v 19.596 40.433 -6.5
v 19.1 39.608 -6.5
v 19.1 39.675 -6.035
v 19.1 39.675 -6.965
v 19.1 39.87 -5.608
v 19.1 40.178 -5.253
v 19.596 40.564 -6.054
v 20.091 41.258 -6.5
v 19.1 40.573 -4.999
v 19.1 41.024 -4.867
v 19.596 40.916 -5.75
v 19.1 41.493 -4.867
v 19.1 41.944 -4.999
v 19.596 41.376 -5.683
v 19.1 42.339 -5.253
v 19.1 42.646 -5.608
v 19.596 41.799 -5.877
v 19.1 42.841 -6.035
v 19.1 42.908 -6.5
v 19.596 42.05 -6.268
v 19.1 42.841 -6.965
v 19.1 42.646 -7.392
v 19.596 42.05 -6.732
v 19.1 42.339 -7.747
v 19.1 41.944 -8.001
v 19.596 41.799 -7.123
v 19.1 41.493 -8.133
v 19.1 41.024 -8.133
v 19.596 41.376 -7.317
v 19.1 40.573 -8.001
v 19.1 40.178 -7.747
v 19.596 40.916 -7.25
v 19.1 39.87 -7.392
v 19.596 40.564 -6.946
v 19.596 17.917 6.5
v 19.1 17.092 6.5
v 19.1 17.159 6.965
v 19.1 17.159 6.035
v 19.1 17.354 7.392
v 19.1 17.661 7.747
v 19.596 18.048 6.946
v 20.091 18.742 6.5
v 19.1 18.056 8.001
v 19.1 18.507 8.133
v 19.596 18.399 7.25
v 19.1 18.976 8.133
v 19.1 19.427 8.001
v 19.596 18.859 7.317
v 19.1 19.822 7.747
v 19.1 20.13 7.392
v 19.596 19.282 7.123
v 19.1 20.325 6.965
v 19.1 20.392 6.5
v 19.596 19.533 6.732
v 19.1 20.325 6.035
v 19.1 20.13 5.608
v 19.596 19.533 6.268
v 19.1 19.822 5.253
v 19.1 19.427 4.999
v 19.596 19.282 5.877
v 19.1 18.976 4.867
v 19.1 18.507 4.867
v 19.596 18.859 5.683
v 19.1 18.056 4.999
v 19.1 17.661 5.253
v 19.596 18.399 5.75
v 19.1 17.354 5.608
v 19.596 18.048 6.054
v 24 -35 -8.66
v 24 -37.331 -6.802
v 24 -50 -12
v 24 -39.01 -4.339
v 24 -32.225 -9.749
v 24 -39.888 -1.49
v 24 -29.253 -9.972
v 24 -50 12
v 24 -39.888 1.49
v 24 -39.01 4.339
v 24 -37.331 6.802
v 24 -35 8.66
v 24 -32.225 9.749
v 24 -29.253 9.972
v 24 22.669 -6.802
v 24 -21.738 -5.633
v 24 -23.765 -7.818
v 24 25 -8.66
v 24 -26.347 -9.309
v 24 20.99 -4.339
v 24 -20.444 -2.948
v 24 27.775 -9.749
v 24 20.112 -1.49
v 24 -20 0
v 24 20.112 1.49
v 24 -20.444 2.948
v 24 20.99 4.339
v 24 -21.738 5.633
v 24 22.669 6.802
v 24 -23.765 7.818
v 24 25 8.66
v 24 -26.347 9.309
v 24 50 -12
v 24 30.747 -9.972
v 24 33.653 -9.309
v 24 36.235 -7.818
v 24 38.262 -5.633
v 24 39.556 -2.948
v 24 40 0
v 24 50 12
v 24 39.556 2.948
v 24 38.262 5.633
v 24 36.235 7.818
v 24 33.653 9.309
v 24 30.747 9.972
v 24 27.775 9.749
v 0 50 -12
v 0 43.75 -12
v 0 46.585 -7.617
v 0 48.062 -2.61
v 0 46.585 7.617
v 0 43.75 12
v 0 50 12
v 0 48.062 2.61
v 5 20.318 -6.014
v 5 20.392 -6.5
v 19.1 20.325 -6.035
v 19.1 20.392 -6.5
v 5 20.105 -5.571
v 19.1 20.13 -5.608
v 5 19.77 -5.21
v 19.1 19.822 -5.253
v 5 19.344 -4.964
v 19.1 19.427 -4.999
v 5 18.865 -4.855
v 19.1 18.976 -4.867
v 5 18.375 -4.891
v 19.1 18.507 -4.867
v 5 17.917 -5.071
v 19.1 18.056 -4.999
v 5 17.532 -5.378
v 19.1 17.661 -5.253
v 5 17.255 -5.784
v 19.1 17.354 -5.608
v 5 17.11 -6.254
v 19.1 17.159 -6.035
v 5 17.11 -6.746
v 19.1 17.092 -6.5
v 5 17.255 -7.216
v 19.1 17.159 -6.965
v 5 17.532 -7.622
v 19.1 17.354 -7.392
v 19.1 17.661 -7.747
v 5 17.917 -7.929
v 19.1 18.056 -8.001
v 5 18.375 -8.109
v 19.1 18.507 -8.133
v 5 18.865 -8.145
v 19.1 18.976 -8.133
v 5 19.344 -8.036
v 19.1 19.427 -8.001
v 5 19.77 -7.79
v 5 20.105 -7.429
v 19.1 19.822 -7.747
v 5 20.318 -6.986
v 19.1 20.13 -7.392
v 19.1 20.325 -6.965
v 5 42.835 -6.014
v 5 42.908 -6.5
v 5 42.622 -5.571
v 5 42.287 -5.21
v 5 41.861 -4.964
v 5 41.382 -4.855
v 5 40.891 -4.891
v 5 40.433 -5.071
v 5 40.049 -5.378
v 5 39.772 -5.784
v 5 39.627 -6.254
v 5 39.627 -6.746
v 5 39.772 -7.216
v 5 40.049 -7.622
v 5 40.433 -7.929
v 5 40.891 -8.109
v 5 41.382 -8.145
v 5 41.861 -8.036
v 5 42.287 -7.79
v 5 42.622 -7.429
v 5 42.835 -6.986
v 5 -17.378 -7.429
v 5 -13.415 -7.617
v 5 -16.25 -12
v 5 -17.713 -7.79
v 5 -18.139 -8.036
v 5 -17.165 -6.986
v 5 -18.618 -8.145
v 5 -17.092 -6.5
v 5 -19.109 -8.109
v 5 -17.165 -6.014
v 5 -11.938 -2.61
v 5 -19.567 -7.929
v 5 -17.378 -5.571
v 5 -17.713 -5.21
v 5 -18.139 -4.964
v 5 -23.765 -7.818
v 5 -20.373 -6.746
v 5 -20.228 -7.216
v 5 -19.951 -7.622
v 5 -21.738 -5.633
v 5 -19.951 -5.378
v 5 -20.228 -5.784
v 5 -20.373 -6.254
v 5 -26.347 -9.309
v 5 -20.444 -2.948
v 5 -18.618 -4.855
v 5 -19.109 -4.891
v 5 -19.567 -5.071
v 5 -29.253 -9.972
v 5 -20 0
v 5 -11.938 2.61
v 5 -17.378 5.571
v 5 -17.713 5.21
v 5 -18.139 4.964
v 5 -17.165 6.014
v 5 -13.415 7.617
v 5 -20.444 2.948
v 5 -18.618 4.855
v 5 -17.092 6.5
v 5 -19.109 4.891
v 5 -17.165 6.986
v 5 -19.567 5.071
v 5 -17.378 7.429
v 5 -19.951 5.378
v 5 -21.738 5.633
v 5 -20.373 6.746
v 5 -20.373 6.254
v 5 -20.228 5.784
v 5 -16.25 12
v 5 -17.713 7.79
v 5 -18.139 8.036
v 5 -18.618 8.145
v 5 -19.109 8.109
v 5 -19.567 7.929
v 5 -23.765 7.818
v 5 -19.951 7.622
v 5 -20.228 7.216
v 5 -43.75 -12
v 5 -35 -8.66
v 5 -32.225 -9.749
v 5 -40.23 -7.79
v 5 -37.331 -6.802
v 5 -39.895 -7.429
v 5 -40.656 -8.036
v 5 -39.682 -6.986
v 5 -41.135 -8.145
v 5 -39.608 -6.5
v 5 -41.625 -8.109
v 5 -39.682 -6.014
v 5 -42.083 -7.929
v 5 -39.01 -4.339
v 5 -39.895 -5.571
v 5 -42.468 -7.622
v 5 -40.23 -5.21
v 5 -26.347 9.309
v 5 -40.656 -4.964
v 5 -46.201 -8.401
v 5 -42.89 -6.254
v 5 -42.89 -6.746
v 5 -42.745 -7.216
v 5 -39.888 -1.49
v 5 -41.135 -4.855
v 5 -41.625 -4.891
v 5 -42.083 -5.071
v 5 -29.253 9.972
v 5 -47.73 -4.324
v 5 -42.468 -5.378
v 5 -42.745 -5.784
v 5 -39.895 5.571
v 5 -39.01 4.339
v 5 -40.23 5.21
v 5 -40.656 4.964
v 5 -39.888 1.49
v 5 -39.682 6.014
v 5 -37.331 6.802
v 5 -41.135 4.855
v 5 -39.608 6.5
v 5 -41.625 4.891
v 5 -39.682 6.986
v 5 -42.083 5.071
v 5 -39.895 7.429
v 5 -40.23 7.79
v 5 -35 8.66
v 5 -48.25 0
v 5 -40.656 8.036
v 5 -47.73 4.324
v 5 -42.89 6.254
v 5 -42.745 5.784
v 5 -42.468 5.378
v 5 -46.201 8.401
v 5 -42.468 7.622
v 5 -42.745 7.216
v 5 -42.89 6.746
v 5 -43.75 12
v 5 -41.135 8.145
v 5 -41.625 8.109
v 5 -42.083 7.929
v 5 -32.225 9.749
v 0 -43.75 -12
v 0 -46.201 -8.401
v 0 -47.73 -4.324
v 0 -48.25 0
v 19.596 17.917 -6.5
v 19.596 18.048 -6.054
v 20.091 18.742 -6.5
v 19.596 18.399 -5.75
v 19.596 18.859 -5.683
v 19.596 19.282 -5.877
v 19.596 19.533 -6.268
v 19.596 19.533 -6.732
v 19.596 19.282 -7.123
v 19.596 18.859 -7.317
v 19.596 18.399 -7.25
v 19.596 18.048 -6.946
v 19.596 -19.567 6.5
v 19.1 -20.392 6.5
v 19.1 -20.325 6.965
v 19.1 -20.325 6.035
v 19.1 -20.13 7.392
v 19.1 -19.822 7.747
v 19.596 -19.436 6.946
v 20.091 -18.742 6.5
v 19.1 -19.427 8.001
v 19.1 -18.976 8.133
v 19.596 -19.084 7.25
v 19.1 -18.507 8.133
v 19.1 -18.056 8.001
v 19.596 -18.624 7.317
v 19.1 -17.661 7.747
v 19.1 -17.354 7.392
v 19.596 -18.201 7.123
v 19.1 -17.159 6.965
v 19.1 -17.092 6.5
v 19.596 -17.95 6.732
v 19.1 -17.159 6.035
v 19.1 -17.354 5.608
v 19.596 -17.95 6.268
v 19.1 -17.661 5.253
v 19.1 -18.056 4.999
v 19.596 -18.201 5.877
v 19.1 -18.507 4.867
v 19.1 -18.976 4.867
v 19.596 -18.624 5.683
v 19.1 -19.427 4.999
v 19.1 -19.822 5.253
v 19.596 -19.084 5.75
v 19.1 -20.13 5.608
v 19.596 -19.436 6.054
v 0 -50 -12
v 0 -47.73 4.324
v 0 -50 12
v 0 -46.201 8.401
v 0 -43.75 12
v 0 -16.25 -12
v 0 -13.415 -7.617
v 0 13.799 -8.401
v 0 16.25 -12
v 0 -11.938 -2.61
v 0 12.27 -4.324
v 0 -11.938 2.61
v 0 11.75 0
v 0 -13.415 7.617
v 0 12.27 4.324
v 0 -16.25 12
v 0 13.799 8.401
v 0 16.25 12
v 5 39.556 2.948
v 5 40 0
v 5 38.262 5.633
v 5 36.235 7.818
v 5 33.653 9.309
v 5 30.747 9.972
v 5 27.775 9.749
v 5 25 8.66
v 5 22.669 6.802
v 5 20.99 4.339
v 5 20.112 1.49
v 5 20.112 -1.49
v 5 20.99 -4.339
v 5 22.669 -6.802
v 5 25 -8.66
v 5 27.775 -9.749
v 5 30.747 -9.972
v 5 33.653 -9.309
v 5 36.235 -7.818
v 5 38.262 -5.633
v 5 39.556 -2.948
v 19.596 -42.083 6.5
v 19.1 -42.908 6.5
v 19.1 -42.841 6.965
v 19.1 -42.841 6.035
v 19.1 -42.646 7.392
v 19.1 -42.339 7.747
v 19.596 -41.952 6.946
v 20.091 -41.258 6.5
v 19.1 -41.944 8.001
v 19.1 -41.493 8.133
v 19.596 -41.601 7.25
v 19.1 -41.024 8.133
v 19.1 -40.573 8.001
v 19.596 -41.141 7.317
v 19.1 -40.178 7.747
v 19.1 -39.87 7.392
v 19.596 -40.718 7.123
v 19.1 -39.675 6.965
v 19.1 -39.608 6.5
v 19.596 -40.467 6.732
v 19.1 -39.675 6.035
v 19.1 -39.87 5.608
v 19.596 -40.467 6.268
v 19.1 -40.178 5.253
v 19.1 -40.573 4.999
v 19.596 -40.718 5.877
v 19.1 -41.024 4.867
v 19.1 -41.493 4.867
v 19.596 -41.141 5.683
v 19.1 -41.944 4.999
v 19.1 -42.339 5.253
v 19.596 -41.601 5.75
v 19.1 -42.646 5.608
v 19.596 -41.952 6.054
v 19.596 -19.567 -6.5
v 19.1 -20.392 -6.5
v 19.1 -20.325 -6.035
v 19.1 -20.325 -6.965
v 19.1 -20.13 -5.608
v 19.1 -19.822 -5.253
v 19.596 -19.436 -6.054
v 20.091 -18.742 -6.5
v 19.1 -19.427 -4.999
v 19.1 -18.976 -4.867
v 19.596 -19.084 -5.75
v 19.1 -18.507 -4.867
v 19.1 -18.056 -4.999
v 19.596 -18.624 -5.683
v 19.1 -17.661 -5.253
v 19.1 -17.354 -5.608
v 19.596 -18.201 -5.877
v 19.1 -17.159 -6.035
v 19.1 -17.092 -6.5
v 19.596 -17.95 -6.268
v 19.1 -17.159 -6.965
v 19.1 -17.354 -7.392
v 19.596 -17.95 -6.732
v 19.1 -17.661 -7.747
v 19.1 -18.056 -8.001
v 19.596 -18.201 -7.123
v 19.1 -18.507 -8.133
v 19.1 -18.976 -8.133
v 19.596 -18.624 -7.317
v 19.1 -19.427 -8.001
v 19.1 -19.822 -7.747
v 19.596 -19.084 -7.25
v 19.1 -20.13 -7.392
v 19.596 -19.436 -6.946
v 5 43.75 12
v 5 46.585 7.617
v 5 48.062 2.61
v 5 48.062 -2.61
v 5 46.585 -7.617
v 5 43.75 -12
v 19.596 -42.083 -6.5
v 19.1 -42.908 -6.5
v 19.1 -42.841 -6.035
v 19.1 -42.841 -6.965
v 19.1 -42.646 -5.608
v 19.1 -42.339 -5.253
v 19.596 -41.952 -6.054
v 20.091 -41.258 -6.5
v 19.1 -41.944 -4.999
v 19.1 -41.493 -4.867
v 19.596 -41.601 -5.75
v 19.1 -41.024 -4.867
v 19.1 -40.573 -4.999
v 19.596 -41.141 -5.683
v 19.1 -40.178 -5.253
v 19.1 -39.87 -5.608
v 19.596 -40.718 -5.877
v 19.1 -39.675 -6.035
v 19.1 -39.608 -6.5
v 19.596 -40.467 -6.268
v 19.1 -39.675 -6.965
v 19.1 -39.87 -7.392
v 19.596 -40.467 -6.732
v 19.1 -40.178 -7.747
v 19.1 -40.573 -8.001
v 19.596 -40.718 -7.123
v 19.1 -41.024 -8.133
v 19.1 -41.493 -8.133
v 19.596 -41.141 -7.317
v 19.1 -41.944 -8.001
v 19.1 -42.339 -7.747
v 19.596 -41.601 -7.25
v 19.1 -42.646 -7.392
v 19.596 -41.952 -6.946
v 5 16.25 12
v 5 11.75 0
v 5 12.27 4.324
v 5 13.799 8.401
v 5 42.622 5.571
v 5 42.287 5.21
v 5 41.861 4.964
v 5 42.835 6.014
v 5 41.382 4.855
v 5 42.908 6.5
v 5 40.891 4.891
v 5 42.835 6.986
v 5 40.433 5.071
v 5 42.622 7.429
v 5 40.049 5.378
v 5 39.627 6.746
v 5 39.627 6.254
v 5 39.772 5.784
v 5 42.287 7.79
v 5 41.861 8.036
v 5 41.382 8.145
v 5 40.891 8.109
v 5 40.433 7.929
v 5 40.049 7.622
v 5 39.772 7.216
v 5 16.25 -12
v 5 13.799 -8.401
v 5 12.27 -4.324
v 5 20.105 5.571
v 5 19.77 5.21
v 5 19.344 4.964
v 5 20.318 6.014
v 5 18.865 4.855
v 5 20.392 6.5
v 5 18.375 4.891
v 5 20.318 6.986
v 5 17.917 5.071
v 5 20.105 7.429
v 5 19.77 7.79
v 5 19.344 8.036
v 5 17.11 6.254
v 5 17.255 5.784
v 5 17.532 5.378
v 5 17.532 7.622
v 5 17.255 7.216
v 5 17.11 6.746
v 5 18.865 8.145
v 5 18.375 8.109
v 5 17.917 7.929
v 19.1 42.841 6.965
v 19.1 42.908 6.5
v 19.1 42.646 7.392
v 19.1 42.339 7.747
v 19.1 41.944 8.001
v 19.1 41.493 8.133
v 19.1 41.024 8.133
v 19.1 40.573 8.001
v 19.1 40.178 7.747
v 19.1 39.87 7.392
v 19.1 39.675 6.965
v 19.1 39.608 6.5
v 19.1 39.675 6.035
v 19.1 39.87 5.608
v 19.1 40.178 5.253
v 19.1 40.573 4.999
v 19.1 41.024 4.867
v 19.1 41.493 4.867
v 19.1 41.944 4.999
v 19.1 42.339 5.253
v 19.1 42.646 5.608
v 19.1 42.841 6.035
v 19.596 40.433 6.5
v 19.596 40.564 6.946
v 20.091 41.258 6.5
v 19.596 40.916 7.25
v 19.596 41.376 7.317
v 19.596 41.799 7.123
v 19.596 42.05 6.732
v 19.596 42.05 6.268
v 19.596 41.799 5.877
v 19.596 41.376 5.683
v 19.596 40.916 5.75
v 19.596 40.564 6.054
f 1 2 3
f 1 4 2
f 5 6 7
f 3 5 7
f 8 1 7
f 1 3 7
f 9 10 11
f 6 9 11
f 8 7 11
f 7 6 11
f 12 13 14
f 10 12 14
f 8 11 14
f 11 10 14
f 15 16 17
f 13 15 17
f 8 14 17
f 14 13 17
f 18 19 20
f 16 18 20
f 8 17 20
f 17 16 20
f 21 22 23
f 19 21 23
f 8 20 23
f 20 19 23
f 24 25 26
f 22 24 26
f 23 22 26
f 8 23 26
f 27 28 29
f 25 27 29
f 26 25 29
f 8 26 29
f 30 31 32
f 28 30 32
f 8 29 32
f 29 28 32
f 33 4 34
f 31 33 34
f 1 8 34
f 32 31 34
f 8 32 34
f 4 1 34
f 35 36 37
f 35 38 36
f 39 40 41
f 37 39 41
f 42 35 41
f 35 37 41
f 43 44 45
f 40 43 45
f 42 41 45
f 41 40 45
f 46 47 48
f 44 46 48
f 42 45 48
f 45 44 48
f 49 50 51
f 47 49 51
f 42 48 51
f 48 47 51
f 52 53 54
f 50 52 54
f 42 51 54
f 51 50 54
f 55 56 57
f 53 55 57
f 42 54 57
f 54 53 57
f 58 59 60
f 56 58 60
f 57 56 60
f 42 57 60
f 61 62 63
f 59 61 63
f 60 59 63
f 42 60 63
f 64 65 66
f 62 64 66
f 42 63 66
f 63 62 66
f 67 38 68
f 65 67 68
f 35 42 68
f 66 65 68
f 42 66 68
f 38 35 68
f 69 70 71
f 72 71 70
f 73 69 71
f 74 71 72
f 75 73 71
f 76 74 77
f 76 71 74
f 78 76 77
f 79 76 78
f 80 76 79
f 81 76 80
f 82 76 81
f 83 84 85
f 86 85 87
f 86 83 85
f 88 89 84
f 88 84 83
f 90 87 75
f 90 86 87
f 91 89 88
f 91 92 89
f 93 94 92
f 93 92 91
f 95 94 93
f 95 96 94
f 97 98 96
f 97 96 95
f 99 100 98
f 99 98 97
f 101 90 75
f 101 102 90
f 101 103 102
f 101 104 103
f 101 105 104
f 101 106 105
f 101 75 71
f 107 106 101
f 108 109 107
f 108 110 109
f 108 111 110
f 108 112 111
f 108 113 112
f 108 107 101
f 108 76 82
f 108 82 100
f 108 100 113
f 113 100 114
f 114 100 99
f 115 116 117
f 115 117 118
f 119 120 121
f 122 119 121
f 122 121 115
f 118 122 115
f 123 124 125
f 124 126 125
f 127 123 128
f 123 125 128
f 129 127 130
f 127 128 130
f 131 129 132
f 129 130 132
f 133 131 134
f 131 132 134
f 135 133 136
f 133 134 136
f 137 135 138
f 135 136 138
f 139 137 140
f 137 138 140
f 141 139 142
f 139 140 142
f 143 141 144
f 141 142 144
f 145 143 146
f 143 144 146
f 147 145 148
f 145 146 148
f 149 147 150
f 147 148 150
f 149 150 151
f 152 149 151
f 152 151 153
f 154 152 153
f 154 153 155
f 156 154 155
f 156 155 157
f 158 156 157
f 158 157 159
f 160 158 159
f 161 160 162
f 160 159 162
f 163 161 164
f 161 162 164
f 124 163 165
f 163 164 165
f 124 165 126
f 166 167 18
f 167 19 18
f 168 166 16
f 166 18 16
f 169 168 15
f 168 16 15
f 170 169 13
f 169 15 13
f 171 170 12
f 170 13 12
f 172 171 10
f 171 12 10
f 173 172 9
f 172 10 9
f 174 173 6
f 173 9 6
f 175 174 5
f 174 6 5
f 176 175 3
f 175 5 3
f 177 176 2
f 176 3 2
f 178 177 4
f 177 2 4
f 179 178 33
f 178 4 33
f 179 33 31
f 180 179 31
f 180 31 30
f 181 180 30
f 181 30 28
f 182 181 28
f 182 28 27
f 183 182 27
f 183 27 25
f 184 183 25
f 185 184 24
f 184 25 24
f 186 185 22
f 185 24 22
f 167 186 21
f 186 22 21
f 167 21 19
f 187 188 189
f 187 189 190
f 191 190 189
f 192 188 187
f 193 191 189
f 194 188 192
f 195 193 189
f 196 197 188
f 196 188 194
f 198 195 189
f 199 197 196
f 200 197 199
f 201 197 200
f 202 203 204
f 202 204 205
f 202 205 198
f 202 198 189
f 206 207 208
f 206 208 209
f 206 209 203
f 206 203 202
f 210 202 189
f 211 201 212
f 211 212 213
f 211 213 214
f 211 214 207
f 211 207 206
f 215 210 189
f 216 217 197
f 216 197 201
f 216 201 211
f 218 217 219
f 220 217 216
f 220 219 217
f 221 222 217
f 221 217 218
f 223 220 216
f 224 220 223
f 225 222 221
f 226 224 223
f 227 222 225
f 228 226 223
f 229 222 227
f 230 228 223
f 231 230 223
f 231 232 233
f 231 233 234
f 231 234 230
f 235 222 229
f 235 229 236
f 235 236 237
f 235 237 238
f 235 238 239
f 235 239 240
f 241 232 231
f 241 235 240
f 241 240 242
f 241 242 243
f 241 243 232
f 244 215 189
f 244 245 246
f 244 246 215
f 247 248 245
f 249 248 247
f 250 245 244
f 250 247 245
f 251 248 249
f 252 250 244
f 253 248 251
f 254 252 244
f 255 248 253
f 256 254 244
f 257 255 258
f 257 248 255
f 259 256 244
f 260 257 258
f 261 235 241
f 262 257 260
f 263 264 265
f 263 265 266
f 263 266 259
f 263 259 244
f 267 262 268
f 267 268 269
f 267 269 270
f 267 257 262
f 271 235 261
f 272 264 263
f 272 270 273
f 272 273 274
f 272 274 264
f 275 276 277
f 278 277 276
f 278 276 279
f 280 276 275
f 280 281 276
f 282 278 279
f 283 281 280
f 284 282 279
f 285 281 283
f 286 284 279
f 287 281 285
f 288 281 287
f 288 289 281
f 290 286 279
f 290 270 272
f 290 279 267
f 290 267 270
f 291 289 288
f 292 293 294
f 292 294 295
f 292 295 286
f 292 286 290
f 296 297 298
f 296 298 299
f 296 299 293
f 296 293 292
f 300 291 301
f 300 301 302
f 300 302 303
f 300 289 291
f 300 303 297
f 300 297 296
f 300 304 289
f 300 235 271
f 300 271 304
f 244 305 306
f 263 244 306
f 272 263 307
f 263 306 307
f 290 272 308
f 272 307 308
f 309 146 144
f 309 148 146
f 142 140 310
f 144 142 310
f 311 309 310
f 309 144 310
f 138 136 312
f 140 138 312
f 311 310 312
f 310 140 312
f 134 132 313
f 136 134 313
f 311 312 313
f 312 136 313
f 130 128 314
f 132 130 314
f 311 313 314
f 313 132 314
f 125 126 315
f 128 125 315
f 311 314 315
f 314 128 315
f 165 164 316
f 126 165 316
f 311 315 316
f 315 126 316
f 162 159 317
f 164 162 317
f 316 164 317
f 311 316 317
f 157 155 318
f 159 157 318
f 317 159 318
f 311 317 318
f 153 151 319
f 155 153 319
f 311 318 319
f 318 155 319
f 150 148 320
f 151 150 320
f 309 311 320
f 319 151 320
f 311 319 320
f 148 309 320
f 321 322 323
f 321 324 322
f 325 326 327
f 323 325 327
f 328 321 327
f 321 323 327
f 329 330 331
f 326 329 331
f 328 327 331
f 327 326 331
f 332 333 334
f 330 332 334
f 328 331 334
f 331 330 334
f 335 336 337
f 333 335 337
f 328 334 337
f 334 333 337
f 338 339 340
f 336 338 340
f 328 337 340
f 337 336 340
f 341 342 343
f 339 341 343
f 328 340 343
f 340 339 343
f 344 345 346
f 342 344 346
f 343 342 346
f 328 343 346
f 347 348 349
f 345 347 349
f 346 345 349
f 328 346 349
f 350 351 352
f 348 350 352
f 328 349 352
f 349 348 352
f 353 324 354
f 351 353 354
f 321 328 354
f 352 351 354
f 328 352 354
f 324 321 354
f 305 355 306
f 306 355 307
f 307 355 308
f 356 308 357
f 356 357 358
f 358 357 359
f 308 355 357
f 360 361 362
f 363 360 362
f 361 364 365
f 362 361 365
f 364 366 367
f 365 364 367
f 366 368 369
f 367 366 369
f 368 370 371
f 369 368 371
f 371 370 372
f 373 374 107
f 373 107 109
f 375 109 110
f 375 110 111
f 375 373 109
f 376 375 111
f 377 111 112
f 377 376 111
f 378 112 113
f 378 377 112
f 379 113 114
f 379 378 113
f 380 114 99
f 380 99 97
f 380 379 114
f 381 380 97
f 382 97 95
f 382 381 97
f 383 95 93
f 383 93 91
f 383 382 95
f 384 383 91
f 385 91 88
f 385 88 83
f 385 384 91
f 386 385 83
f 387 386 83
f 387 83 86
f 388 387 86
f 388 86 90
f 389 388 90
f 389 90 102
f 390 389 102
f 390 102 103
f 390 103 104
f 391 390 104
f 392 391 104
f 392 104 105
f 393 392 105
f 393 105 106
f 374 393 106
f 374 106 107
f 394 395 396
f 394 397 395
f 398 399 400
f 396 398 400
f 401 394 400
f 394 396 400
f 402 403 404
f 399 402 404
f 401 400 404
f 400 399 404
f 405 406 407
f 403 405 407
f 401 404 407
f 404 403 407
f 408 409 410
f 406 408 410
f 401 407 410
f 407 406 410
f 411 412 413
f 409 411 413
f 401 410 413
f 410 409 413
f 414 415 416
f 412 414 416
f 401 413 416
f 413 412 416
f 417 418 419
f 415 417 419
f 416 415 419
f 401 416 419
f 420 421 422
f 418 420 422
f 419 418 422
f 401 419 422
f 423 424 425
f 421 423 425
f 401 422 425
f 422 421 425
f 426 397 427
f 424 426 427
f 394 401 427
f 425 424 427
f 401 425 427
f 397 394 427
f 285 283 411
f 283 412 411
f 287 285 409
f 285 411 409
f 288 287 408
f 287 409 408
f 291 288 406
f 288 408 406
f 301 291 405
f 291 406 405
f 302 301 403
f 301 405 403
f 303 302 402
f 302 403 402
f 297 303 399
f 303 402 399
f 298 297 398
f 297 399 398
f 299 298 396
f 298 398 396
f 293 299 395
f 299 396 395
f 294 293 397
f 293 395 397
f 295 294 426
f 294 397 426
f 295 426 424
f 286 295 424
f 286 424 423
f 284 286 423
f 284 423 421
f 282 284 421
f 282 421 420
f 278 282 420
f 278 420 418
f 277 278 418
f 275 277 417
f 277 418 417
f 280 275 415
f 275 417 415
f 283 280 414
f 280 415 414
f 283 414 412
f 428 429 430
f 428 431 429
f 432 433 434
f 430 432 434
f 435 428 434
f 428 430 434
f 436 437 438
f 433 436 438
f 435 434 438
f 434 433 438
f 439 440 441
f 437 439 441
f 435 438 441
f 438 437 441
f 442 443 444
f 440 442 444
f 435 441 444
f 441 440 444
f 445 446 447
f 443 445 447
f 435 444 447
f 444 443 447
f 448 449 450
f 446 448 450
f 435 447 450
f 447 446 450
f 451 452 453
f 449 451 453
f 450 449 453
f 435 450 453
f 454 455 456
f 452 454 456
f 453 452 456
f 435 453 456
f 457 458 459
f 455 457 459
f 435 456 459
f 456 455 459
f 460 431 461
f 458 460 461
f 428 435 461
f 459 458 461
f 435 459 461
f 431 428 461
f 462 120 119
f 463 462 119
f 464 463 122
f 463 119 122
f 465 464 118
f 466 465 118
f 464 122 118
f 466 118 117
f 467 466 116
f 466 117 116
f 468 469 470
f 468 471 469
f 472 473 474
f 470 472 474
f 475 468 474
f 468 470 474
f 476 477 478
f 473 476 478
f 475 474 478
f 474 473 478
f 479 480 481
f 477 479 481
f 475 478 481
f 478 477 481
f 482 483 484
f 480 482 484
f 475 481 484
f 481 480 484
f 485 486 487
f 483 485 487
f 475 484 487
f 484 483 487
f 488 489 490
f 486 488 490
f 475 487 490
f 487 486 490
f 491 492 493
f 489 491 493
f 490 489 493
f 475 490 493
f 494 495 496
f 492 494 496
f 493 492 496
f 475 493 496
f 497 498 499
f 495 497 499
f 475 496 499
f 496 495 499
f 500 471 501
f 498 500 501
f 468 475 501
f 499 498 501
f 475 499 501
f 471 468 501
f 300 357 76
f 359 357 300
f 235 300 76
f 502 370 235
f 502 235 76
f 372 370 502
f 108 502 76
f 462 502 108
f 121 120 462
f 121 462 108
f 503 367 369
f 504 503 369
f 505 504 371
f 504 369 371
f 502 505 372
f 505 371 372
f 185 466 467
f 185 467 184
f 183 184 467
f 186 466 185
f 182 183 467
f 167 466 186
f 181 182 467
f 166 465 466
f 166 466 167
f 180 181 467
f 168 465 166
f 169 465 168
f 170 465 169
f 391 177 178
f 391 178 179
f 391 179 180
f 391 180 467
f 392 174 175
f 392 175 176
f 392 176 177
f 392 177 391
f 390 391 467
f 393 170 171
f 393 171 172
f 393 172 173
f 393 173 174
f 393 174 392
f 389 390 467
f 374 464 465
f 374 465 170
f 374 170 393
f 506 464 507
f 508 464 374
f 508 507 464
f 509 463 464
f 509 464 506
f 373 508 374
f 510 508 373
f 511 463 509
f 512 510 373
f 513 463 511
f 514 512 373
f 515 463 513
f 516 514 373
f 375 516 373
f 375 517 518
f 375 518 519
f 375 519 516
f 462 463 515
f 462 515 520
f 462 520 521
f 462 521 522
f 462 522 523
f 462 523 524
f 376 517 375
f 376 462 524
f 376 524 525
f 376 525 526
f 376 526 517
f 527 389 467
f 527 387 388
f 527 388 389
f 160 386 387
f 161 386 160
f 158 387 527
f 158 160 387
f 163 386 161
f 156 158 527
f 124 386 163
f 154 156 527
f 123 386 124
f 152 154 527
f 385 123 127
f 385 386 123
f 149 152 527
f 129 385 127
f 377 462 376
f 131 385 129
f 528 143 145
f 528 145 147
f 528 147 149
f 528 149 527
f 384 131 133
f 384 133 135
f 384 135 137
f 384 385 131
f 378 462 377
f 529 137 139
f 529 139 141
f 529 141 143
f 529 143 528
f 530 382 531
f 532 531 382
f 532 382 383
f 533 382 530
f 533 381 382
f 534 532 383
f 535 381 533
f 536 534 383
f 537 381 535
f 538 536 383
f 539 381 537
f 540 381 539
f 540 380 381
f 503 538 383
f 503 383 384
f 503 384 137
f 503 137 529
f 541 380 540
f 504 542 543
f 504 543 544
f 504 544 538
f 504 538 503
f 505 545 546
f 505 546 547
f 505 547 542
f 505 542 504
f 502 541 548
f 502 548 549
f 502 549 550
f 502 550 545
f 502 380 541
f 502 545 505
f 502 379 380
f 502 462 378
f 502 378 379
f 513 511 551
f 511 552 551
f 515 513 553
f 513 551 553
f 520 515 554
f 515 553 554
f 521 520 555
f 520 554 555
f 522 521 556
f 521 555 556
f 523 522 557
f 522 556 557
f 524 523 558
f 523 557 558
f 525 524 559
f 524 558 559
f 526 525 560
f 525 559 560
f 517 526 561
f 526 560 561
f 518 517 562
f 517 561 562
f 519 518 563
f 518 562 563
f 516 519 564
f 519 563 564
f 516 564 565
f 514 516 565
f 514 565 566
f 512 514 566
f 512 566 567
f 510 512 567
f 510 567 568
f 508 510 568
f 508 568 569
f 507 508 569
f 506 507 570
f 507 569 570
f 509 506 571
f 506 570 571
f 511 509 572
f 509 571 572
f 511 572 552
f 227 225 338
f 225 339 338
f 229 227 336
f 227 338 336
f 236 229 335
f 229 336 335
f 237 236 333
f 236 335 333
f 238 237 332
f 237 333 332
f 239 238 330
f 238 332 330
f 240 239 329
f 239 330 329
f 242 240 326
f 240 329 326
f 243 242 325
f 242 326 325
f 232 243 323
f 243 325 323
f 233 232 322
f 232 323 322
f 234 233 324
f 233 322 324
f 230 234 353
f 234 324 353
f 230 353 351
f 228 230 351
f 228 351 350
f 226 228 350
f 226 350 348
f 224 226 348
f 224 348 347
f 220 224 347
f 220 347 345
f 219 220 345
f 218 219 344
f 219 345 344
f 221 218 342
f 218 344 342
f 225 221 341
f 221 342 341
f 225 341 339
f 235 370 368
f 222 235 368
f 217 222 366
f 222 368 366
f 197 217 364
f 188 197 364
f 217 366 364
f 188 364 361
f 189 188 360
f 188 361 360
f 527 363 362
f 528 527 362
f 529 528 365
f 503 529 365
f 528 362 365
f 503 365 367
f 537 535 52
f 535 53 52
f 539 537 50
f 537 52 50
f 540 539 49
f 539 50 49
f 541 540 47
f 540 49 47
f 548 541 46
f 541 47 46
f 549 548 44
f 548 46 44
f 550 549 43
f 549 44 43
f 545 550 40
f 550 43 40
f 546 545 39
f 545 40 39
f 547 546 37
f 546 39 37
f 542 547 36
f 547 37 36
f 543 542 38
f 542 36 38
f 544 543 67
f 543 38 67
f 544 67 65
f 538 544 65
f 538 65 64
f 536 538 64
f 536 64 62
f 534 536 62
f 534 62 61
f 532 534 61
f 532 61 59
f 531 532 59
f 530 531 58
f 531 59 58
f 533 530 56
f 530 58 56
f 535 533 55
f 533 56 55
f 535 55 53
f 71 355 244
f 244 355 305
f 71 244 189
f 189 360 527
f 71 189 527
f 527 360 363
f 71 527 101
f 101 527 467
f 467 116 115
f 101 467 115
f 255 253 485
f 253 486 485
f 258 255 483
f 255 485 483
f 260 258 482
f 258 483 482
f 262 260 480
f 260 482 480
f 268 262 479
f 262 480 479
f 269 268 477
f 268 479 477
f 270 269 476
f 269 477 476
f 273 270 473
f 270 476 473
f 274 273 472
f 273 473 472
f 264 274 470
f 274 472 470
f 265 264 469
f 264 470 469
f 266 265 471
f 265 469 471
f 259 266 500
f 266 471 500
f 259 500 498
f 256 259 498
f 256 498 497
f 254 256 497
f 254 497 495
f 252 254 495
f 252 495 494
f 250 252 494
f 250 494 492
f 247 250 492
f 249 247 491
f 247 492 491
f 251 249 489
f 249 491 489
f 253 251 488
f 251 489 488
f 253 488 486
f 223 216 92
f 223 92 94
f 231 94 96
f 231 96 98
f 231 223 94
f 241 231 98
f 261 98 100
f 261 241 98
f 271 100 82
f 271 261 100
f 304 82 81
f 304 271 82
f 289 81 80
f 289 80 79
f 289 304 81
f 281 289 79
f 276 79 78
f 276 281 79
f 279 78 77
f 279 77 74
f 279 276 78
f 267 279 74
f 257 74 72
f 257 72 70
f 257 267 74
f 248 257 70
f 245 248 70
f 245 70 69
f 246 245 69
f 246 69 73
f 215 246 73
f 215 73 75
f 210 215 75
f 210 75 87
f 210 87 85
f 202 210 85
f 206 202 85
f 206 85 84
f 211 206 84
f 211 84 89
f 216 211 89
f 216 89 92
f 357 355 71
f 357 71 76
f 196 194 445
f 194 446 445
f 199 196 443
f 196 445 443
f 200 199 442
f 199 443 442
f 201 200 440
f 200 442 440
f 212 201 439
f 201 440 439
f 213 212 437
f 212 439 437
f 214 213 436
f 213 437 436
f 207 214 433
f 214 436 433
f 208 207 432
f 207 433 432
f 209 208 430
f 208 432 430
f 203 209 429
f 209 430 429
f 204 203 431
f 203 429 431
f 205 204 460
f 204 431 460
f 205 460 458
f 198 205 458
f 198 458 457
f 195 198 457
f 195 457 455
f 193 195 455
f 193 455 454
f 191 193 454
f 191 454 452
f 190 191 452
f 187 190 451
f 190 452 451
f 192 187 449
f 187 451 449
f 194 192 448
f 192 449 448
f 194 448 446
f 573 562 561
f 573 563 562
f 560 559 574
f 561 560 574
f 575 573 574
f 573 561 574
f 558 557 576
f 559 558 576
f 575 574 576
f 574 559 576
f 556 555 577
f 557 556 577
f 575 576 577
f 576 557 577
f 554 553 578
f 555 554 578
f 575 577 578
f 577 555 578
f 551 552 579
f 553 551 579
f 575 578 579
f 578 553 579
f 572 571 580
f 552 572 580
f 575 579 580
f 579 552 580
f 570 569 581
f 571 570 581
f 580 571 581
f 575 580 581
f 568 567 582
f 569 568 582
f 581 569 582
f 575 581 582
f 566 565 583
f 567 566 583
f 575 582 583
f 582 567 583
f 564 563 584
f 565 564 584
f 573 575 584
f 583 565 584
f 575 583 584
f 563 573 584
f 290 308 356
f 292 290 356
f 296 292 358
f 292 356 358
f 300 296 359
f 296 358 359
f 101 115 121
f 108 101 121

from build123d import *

# Parameters (mm, degrees)
F0_W     = 100
F0_H     = 24
F0_R     = 10
F1_DEPTH = 24
F2_R     = 10
F3_DEPTH = 5
F5_D     = 3.3
F5_DEPTH = 14.1
F5_TIP   = 0.9914200214


with BuildPart() as f1:
    # F0 (on Right) → F1 (new body)
    with BuildSketch(Plane.YZ):
        Rectangle(F0_W, F0_H)
        with Locations((-30, 0)):
            Circle(F0_R, mode=Mode.SUBTRACT)
        with Locations((30, 0)):
            Circle(F0_R, mode=Mode.SUBTRACT)
    extrude(amount=F1_DEPTH)

    # F2 (on face) → F3 (cut)
    with BuildSketch(Plane(origin=(0, 0, 0), x_dir=(0, -1, 0), z_dir=(-1, 0, 0))):
        with BuildLine():
            ThreePointArc((-16.25, -12), (-12.9119925094, -6.408002809), (-11.75, 0))
            ThreePointArc((-11.75, 0), (-12.9119925094, 6.408002809), (-16.25, 12))
            Line((-16.25, 12), (-43.75, 12))
            ThreePointArc((-43.75, 12), (-48.25, 0), (-43.75, -12))
            Line((-43.75, -12), (-16.25, -12))
        make_face()
        with Locations((-30, 0)):
            Circle(F2_R, mode=Mode.SUBTRACT)
        with BuildLine():
            Line((43.75, 12), (16.25, 12))
            ThreePointArc((16.25, 12), (11.75, 0), (16.25, -12))
            Line((16.25, -12), (43.75, -12))
            ThreePointArc((43.75, -12), (47.0880074906, -6.408002809), (48.25, 0))
            ThreePointArc((48.25, 0), (47.0880074906, 6.408002809), (43.75, 12))
        make_face()
        with Locations((30, 0)):
            Circle(F2_R, mode=Mode.SUBTRACT)
    extrude(amount=-F3_DEPTH, mode=Mode.SUBTRACT)

    # F5
    with Locations(Plane(origin=(5, 0, 0), x_dir=(0, -1, 0), z_dir=(-1, 0, 0))):
        with Locations((-41.2583302492, 6.5), (-41.2583302492, -6.5), (-18.7416697508, 6.5), (-18.7416697508, -6.5), (18.7416697508, 6.5), (18.7416697508, -6.5), (41.2583302492, 6.5), (41.2583302492, -6.5)):
            Hole(F5_D / 2, depth=F5_DEPTH)
            with Locations((0, 0, -(F5_DEPTH + F5_TIP / 2))):  # 118° drill point
                Cone(0, F5_D / 2, F5_TIP, mode=Mode.SUBTRACT)


solid = f1.part
